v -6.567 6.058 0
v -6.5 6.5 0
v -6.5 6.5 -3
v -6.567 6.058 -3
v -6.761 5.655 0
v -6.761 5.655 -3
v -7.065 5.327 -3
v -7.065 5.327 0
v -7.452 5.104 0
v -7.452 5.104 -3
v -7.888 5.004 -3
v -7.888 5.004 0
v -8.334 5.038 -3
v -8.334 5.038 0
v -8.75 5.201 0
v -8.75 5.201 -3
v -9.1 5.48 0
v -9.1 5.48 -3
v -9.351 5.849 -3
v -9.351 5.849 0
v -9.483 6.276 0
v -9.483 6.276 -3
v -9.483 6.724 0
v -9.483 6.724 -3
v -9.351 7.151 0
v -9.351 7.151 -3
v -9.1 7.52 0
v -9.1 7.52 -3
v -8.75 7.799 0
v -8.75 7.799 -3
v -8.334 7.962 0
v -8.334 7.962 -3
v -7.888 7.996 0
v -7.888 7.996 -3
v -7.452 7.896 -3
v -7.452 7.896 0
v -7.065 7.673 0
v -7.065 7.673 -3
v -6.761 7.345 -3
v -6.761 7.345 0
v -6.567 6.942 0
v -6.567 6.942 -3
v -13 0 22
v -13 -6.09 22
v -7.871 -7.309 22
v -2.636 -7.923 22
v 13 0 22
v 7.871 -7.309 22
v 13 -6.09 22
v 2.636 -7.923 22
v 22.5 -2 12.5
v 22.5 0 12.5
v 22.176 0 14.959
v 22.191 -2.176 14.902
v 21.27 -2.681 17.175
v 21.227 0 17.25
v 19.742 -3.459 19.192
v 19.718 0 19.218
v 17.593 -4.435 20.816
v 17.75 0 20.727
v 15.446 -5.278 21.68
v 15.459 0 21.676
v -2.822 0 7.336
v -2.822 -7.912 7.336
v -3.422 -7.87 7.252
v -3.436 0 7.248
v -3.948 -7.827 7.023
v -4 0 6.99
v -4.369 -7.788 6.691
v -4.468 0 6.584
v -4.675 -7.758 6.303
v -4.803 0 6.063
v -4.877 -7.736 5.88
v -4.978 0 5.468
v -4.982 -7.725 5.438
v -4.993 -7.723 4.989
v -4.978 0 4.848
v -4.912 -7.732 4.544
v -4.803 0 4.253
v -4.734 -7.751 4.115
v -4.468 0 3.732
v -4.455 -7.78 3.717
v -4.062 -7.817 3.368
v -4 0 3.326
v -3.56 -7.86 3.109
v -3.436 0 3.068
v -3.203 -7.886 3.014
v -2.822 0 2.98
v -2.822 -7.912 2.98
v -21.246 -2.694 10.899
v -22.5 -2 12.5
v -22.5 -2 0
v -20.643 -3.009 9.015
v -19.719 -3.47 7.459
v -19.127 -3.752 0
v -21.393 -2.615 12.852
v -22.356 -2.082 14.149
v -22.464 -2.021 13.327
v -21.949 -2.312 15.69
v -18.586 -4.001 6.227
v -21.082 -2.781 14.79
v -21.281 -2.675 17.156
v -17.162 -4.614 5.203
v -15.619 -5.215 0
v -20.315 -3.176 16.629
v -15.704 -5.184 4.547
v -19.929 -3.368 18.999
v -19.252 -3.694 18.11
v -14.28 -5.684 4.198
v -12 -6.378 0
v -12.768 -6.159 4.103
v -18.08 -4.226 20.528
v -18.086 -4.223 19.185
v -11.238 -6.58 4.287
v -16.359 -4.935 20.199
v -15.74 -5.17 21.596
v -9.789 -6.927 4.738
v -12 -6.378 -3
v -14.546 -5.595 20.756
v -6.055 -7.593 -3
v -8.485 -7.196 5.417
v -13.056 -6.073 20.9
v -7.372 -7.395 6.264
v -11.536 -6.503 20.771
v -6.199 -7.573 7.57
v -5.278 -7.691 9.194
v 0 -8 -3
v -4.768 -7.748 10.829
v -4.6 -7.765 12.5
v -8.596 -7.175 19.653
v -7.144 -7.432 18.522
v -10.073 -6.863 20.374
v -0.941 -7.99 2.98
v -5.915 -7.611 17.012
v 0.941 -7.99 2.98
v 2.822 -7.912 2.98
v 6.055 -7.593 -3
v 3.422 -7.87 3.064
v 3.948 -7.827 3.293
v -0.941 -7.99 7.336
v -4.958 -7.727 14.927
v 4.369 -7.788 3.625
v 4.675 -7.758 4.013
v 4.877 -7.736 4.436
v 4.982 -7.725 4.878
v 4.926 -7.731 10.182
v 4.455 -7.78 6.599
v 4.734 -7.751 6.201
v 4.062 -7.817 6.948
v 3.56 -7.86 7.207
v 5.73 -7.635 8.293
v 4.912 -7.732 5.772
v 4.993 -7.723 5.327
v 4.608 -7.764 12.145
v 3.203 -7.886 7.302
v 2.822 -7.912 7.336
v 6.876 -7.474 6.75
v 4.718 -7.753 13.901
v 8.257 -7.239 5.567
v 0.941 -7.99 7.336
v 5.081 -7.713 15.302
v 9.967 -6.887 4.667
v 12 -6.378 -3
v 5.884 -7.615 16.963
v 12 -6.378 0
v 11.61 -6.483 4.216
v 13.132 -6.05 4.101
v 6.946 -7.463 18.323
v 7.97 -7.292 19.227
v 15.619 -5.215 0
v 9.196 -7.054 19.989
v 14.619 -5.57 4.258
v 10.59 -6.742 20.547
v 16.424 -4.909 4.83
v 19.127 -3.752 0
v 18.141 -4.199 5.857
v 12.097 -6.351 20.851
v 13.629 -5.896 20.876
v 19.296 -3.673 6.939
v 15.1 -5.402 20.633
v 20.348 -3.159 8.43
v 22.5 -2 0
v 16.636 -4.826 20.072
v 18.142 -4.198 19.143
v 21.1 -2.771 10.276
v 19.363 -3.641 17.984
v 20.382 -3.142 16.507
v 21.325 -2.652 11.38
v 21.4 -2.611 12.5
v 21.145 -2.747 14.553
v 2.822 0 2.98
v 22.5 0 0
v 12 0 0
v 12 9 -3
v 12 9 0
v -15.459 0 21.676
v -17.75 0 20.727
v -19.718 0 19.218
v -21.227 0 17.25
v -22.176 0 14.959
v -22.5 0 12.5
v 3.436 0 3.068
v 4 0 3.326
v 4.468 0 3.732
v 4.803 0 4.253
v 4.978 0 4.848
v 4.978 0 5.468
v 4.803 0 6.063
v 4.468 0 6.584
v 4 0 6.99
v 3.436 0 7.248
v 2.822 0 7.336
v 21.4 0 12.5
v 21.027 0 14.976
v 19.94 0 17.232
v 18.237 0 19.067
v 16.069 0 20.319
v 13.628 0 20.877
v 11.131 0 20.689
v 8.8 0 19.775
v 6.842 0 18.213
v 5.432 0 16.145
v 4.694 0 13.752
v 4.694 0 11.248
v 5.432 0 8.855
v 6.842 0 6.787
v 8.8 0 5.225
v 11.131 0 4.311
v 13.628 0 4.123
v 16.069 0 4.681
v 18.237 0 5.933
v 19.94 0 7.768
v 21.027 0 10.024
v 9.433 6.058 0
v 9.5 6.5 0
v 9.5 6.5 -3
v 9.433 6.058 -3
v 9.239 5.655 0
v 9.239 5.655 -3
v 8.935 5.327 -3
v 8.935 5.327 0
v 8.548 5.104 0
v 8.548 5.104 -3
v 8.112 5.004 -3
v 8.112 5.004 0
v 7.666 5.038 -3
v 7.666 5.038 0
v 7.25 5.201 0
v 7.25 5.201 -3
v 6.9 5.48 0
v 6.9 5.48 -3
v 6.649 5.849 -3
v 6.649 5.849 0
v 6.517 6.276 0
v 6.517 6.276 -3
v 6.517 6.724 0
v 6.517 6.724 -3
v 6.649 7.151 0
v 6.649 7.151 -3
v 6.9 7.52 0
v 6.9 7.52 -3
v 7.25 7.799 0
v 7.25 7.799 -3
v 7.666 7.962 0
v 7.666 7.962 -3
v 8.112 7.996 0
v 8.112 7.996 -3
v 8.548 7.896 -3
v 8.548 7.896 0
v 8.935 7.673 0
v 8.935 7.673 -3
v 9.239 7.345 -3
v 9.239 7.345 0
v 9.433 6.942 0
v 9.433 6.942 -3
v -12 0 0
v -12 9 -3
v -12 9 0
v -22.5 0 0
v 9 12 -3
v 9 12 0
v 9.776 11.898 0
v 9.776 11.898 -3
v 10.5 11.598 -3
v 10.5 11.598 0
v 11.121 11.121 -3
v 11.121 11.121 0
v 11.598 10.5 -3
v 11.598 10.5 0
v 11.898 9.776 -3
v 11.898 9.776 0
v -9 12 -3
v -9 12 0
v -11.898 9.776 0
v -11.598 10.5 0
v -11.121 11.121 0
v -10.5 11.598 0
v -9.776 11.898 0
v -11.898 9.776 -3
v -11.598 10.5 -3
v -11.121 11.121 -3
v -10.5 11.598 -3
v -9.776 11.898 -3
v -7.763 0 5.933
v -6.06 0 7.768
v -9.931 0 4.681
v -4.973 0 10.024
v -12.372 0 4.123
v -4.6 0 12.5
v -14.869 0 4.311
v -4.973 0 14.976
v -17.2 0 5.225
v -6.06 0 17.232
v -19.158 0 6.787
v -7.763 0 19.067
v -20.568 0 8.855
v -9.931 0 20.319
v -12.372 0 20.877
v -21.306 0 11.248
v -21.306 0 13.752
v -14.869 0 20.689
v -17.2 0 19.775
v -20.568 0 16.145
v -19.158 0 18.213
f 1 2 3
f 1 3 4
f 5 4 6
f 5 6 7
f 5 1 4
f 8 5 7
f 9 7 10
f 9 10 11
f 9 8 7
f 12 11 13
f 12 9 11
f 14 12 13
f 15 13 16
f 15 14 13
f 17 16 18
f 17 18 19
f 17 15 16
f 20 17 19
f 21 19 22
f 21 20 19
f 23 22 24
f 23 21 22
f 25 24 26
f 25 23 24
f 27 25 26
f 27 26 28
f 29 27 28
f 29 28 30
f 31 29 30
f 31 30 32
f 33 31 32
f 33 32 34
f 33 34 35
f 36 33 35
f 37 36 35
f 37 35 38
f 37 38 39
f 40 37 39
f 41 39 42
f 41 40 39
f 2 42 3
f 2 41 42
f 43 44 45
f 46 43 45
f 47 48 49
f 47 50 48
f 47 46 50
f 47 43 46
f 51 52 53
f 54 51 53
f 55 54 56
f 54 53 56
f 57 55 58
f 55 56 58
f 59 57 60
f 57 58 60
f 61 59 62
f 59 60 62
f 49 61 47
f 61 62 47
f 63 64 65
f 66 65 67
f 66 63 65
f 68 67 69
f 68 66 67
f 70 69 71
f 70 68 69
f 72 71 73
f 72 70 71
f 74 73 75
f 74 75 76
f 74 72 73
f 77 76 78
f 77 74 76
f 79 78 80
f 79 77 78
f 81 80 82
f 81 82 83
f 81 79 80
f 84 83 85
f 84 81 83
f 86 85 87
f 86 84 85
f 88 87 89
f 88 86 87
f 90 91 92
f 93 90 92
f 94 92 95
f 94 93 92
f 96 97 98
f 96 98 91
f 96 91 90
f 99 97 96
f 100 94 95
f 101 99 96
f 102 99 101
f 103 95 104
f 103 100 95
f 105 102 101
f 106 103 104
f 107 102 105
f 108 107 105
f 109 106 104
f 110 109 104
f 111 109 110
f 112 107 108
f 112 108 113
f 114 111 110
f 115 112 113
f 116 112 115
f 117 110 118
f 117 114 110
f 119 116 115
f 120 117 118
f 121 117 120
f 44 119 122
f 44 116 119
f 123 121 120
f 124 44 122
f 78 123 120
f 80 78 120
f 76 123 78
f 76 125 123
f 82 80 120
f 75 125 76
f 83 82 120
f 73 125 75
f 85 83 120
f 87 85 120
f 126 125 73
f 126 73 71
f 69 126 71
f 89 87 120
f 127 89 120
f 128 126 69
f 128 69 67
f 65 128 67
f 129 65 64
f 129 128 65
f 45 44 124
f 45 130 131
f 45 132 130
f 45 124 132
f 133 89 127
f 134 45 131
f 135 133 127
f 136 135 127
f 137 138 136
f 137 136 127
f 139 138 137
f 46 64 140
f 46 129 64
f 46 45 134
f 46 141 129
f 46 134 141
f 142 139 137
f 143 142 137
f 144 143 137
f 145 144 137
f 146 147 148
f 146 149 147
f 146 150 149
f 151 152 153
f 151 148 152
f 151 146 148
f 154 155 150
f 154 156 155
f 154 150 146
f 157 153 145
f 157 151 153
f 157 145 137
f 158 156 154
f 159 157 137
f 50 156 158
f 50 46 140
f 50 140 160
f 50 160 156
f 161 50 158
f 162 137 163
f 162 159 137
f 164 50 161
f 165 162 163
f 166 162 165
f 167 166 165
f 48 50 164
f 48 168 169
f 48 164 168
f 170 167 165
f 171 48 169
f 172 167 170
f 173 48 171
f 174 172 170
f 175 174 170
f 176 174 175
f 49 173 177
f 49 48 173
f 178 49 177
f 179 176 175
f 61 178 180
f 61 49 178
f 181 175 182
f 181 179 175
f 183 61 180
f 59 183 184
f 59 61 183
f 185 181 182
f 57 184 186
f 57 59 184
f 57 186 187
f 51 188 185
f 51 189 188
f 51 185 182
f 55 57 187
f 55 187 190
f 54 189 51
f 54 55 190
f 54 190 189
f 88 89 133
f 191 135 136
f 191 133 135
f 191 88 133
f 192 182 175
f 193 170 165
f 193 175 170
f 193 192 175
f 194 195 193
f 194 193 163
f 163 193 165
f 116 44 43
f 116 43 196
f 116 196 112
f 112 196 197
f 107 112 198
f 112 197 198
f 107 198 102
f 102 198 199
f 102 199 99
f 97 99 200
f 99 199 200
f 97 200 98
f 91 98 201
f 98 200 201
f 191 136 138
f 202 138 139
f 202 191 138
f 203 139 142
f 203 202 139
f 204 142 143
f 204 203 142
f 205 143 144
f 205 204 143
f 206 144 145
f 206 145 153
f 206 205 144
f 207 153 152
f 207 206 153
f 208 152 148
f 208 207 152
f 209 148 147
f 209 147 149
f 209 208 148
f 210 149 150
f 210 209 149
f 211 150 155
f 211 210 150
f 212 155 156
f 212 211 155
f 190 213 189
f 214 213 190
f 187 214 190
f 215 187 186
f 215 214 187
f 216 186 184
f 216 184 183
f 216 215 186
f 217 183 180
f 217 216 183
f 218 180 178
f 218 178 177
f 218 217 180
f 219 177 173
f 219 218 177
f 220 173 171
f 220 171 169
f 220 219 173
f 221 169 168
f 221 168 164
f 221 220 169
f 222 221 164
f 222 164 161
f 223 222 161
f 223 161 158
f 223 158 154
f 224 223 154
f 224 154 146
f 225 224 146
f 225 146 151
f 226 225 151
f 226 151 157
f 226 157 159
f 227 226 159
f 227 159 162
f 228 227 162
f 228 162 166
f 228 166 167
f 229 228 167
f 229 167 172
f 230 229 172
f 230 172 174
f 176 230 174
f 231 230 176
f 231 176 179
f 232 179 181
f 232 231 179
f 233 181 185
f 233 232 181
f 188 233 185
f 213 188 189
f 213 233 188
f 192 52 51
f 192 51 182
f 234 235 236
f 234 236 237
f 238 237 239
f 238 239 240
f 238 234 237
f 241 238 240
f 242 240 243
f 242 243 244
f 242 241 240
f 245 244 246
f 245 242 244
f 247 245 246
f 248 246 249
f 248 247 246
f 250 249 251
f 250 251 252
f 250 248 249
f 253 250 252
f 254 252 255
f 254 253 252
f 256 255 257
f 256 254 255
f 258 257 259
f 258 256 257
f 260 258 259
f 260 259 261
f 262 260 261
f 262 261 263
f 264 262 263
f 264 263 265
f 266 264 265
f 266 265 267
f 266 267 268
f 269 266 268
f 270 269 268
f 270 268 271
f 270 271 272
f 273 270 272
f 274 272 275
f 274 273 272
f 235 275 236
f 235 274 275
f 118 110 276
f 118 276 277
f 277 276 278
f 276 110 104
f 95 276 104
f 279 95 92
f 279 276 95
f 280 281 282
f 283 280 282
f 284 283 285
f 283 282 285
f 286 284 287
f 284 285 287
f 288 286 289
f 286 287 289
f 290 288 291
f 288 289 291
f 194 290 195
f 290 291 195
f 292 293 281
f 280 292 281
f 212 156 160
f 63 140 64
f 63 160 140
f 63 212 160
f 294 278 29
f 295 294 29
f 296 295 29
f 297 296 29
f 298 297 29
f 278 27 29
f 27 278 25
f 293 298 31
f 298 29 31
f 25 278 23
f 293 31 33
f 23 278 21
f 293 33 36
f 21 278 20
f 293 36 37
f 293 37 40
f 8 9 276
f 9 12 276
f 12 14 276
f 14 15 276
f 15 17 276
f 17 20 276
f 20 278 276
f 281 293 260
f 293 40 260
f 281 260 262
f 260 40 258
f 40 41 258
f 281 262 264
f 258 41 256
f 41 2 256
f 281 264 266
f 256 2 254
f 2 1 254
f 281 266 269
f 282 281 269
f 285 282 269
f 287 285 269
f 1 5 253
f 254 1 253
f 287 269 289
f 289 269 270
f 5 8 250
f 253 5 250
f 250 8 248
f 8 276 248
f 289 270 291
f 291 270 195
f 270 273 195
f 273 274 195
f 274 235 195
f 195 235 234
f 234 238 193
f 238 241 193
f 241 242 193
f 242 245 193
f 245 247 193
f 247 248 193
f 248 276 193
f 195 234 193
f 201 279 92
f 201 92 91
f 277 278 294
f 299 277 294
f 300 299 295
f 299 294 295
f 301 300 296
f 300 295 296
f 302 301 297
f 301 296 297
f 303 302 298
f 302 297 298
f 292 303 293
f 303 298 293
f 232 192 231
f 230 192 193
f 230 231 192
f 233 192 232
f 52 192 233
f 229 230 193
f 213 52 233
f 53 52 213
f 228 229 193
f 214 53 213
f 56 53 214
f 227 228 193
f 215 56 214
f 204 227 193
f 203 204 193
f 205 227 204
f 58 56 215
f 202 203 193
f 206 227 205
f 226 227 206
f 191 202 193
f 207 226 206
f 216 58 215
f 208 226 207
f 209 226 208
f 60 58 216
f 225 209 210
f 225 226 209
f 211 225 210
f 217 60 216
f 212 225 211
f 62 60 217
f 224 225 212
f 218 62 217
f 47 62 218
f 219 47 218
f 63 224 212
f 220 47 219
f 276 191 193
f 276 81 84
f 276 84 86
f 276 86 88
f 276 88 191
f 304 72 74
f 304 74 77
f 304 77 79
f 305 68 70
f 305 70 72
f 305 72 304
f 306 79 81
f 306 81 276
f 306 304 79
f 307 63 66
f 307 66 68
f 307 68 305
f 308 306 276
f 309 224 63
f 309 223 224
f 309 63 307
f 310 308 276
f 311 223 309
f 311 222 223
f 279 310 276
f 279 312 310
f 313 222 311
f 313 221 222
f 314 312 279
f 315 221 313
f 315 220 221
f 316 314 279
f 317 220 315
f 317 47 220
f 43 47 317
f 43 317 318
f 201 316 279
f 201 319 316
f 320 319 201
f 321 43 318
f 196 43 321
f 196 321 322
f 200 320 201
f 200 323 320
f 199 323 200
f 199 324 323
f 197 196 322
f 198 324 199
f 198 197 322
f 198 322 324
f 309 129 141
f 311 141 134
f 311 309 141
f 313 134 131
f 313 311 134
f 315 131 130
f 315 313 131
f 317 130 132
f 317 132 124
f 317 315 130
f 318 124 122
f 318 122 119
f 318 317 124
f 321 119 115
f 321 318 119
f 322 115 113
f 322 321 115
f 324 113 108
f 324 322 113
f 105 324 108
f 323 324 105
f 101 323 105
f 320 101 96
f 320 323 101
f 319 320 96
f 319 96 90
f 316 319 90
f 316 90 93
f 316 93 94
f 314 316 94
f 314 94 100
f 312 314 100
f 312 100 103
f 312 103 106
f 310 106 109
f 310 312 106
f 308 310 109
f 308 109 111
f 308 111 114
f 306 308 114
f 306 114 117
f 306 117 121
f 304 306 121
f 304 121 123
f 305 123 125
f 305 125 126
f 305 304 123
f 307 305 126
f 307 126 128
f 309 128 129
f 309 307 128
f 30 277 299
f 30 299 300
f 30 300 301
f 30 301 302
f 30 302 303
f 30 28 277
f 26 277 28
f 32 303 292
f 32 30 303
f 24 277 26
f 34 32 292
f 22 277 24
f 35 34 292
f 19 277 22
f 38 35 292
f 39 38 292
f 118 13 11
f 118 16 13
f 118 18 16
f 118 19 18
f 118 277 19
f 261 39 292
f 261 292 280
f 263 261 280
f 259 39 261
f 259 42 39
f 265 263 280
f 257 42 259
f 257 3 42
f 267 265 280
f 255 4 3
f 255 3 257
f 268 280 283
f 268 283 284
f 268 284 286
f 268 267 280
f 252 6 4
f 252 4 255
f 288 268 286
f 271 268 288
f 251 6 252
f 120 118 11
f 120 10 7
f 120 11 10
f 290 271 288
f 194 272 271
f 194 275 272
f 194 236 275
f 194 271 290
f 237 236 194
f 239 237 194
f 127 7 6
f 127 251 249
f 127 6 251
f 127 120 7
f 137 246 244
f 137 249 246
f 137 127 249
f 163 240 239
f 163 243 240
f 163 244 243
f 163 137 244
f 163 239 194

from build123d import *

# Parameters (mm, degrees)
SKETCH_R     = 8.4
PAD_DEPTH    = 8
SKETCH001_R  = 1.5
PAD001_DEPTH = 3
POCKET_DEPTH = 25.001


with BuildPart() as part:
    # Sketch → Pad (new body)
    with BuildSketch(Plane.XZ):
        with BuildLine():
            Line((-13, 22), (13, 22))
            ThreePointArc((22.5, 12.5), (19.717514, 19.217514), (13, 22))
            Line((22.5, 12.5), (22.5, 0))
            Line((22.5, 0), (-22.5, 0))
            Line((-22.5, 0), (-22.5, 12.5))
            ThreePointArc((-13, 22), (-19.717514, 19.217514), (-22.5, 12.5))
        make_face()
        with Locations((-13, 12.5)):
            Circle(SKETCH_R, mode=Mode.SUBTRACT)
        with Locations((13, 12.5)):
            Circle(SKETCH_R, mode=Mode.SUBTRACT)
        with BuildLine():
            ThreePointArc((-2.822, 7.336), (-5, 5.158), (-2.822, 2.98))
            Line((-2.822, 2.98), (2.822, 2.98))
            ThreePointArc((2.822, 2.98), (5, 5.158), (2.822, 7.336))
            Line((2.822, 7.336), (-2.822, 7.336))
        make_face(mode=Mode.SUBTRACT)
    extrude(amount=PAD_DEPTH)

    # Sketch001 (on Face2 of Pad) → Pad001 (join)
    with BuildSketch(Plane(origin=(0, 0, 0), x_dir=(1, 0, 0), z_dir=(0, 0, -1))):
        with BuildLine():
            Line((-9, -12), (9, -12))
            ThreePointArc((9, -12), (11.12132, -11.12132), (12, -9))
            Line((12, -9), (12, 8))
            Line((12, 8), (-12, 8))
            Line((-12, 8), (-12, -9))
            ThreePointArc((-12, -9), (-11.12132, -11.12132), (-9, -12))
        make_face()
        with Locations((-8, -6.5)):
            Circle(SKETCH001_R, mode=Mode.SUBTRACT)
        with Locations((8, -6.5)):
            Circle(SKETCH001_R, mode=Mode.SUBTRACT)
    extrude(amount=PAD001_DEPTH)

    # Sketch002 (on Face6 of Pad001) → Pocket (cut, through all)
    with BuildSketch(Plane.XY.offset(22)):
        with BuildLine():
            Line((-22.5, -2), (-22.5, -9))
            Line((-22.5, -9), (22.5, -9))
            Line((22.5, -9), (22.5, -2))
            ThreePointArc((-22.5, -2), (0, -8), (22.5, -2))
        make_face()
    extrude(amount=-POCKET_DEPTH, mode=Mode.SUBTRACT)


solid = part.part
